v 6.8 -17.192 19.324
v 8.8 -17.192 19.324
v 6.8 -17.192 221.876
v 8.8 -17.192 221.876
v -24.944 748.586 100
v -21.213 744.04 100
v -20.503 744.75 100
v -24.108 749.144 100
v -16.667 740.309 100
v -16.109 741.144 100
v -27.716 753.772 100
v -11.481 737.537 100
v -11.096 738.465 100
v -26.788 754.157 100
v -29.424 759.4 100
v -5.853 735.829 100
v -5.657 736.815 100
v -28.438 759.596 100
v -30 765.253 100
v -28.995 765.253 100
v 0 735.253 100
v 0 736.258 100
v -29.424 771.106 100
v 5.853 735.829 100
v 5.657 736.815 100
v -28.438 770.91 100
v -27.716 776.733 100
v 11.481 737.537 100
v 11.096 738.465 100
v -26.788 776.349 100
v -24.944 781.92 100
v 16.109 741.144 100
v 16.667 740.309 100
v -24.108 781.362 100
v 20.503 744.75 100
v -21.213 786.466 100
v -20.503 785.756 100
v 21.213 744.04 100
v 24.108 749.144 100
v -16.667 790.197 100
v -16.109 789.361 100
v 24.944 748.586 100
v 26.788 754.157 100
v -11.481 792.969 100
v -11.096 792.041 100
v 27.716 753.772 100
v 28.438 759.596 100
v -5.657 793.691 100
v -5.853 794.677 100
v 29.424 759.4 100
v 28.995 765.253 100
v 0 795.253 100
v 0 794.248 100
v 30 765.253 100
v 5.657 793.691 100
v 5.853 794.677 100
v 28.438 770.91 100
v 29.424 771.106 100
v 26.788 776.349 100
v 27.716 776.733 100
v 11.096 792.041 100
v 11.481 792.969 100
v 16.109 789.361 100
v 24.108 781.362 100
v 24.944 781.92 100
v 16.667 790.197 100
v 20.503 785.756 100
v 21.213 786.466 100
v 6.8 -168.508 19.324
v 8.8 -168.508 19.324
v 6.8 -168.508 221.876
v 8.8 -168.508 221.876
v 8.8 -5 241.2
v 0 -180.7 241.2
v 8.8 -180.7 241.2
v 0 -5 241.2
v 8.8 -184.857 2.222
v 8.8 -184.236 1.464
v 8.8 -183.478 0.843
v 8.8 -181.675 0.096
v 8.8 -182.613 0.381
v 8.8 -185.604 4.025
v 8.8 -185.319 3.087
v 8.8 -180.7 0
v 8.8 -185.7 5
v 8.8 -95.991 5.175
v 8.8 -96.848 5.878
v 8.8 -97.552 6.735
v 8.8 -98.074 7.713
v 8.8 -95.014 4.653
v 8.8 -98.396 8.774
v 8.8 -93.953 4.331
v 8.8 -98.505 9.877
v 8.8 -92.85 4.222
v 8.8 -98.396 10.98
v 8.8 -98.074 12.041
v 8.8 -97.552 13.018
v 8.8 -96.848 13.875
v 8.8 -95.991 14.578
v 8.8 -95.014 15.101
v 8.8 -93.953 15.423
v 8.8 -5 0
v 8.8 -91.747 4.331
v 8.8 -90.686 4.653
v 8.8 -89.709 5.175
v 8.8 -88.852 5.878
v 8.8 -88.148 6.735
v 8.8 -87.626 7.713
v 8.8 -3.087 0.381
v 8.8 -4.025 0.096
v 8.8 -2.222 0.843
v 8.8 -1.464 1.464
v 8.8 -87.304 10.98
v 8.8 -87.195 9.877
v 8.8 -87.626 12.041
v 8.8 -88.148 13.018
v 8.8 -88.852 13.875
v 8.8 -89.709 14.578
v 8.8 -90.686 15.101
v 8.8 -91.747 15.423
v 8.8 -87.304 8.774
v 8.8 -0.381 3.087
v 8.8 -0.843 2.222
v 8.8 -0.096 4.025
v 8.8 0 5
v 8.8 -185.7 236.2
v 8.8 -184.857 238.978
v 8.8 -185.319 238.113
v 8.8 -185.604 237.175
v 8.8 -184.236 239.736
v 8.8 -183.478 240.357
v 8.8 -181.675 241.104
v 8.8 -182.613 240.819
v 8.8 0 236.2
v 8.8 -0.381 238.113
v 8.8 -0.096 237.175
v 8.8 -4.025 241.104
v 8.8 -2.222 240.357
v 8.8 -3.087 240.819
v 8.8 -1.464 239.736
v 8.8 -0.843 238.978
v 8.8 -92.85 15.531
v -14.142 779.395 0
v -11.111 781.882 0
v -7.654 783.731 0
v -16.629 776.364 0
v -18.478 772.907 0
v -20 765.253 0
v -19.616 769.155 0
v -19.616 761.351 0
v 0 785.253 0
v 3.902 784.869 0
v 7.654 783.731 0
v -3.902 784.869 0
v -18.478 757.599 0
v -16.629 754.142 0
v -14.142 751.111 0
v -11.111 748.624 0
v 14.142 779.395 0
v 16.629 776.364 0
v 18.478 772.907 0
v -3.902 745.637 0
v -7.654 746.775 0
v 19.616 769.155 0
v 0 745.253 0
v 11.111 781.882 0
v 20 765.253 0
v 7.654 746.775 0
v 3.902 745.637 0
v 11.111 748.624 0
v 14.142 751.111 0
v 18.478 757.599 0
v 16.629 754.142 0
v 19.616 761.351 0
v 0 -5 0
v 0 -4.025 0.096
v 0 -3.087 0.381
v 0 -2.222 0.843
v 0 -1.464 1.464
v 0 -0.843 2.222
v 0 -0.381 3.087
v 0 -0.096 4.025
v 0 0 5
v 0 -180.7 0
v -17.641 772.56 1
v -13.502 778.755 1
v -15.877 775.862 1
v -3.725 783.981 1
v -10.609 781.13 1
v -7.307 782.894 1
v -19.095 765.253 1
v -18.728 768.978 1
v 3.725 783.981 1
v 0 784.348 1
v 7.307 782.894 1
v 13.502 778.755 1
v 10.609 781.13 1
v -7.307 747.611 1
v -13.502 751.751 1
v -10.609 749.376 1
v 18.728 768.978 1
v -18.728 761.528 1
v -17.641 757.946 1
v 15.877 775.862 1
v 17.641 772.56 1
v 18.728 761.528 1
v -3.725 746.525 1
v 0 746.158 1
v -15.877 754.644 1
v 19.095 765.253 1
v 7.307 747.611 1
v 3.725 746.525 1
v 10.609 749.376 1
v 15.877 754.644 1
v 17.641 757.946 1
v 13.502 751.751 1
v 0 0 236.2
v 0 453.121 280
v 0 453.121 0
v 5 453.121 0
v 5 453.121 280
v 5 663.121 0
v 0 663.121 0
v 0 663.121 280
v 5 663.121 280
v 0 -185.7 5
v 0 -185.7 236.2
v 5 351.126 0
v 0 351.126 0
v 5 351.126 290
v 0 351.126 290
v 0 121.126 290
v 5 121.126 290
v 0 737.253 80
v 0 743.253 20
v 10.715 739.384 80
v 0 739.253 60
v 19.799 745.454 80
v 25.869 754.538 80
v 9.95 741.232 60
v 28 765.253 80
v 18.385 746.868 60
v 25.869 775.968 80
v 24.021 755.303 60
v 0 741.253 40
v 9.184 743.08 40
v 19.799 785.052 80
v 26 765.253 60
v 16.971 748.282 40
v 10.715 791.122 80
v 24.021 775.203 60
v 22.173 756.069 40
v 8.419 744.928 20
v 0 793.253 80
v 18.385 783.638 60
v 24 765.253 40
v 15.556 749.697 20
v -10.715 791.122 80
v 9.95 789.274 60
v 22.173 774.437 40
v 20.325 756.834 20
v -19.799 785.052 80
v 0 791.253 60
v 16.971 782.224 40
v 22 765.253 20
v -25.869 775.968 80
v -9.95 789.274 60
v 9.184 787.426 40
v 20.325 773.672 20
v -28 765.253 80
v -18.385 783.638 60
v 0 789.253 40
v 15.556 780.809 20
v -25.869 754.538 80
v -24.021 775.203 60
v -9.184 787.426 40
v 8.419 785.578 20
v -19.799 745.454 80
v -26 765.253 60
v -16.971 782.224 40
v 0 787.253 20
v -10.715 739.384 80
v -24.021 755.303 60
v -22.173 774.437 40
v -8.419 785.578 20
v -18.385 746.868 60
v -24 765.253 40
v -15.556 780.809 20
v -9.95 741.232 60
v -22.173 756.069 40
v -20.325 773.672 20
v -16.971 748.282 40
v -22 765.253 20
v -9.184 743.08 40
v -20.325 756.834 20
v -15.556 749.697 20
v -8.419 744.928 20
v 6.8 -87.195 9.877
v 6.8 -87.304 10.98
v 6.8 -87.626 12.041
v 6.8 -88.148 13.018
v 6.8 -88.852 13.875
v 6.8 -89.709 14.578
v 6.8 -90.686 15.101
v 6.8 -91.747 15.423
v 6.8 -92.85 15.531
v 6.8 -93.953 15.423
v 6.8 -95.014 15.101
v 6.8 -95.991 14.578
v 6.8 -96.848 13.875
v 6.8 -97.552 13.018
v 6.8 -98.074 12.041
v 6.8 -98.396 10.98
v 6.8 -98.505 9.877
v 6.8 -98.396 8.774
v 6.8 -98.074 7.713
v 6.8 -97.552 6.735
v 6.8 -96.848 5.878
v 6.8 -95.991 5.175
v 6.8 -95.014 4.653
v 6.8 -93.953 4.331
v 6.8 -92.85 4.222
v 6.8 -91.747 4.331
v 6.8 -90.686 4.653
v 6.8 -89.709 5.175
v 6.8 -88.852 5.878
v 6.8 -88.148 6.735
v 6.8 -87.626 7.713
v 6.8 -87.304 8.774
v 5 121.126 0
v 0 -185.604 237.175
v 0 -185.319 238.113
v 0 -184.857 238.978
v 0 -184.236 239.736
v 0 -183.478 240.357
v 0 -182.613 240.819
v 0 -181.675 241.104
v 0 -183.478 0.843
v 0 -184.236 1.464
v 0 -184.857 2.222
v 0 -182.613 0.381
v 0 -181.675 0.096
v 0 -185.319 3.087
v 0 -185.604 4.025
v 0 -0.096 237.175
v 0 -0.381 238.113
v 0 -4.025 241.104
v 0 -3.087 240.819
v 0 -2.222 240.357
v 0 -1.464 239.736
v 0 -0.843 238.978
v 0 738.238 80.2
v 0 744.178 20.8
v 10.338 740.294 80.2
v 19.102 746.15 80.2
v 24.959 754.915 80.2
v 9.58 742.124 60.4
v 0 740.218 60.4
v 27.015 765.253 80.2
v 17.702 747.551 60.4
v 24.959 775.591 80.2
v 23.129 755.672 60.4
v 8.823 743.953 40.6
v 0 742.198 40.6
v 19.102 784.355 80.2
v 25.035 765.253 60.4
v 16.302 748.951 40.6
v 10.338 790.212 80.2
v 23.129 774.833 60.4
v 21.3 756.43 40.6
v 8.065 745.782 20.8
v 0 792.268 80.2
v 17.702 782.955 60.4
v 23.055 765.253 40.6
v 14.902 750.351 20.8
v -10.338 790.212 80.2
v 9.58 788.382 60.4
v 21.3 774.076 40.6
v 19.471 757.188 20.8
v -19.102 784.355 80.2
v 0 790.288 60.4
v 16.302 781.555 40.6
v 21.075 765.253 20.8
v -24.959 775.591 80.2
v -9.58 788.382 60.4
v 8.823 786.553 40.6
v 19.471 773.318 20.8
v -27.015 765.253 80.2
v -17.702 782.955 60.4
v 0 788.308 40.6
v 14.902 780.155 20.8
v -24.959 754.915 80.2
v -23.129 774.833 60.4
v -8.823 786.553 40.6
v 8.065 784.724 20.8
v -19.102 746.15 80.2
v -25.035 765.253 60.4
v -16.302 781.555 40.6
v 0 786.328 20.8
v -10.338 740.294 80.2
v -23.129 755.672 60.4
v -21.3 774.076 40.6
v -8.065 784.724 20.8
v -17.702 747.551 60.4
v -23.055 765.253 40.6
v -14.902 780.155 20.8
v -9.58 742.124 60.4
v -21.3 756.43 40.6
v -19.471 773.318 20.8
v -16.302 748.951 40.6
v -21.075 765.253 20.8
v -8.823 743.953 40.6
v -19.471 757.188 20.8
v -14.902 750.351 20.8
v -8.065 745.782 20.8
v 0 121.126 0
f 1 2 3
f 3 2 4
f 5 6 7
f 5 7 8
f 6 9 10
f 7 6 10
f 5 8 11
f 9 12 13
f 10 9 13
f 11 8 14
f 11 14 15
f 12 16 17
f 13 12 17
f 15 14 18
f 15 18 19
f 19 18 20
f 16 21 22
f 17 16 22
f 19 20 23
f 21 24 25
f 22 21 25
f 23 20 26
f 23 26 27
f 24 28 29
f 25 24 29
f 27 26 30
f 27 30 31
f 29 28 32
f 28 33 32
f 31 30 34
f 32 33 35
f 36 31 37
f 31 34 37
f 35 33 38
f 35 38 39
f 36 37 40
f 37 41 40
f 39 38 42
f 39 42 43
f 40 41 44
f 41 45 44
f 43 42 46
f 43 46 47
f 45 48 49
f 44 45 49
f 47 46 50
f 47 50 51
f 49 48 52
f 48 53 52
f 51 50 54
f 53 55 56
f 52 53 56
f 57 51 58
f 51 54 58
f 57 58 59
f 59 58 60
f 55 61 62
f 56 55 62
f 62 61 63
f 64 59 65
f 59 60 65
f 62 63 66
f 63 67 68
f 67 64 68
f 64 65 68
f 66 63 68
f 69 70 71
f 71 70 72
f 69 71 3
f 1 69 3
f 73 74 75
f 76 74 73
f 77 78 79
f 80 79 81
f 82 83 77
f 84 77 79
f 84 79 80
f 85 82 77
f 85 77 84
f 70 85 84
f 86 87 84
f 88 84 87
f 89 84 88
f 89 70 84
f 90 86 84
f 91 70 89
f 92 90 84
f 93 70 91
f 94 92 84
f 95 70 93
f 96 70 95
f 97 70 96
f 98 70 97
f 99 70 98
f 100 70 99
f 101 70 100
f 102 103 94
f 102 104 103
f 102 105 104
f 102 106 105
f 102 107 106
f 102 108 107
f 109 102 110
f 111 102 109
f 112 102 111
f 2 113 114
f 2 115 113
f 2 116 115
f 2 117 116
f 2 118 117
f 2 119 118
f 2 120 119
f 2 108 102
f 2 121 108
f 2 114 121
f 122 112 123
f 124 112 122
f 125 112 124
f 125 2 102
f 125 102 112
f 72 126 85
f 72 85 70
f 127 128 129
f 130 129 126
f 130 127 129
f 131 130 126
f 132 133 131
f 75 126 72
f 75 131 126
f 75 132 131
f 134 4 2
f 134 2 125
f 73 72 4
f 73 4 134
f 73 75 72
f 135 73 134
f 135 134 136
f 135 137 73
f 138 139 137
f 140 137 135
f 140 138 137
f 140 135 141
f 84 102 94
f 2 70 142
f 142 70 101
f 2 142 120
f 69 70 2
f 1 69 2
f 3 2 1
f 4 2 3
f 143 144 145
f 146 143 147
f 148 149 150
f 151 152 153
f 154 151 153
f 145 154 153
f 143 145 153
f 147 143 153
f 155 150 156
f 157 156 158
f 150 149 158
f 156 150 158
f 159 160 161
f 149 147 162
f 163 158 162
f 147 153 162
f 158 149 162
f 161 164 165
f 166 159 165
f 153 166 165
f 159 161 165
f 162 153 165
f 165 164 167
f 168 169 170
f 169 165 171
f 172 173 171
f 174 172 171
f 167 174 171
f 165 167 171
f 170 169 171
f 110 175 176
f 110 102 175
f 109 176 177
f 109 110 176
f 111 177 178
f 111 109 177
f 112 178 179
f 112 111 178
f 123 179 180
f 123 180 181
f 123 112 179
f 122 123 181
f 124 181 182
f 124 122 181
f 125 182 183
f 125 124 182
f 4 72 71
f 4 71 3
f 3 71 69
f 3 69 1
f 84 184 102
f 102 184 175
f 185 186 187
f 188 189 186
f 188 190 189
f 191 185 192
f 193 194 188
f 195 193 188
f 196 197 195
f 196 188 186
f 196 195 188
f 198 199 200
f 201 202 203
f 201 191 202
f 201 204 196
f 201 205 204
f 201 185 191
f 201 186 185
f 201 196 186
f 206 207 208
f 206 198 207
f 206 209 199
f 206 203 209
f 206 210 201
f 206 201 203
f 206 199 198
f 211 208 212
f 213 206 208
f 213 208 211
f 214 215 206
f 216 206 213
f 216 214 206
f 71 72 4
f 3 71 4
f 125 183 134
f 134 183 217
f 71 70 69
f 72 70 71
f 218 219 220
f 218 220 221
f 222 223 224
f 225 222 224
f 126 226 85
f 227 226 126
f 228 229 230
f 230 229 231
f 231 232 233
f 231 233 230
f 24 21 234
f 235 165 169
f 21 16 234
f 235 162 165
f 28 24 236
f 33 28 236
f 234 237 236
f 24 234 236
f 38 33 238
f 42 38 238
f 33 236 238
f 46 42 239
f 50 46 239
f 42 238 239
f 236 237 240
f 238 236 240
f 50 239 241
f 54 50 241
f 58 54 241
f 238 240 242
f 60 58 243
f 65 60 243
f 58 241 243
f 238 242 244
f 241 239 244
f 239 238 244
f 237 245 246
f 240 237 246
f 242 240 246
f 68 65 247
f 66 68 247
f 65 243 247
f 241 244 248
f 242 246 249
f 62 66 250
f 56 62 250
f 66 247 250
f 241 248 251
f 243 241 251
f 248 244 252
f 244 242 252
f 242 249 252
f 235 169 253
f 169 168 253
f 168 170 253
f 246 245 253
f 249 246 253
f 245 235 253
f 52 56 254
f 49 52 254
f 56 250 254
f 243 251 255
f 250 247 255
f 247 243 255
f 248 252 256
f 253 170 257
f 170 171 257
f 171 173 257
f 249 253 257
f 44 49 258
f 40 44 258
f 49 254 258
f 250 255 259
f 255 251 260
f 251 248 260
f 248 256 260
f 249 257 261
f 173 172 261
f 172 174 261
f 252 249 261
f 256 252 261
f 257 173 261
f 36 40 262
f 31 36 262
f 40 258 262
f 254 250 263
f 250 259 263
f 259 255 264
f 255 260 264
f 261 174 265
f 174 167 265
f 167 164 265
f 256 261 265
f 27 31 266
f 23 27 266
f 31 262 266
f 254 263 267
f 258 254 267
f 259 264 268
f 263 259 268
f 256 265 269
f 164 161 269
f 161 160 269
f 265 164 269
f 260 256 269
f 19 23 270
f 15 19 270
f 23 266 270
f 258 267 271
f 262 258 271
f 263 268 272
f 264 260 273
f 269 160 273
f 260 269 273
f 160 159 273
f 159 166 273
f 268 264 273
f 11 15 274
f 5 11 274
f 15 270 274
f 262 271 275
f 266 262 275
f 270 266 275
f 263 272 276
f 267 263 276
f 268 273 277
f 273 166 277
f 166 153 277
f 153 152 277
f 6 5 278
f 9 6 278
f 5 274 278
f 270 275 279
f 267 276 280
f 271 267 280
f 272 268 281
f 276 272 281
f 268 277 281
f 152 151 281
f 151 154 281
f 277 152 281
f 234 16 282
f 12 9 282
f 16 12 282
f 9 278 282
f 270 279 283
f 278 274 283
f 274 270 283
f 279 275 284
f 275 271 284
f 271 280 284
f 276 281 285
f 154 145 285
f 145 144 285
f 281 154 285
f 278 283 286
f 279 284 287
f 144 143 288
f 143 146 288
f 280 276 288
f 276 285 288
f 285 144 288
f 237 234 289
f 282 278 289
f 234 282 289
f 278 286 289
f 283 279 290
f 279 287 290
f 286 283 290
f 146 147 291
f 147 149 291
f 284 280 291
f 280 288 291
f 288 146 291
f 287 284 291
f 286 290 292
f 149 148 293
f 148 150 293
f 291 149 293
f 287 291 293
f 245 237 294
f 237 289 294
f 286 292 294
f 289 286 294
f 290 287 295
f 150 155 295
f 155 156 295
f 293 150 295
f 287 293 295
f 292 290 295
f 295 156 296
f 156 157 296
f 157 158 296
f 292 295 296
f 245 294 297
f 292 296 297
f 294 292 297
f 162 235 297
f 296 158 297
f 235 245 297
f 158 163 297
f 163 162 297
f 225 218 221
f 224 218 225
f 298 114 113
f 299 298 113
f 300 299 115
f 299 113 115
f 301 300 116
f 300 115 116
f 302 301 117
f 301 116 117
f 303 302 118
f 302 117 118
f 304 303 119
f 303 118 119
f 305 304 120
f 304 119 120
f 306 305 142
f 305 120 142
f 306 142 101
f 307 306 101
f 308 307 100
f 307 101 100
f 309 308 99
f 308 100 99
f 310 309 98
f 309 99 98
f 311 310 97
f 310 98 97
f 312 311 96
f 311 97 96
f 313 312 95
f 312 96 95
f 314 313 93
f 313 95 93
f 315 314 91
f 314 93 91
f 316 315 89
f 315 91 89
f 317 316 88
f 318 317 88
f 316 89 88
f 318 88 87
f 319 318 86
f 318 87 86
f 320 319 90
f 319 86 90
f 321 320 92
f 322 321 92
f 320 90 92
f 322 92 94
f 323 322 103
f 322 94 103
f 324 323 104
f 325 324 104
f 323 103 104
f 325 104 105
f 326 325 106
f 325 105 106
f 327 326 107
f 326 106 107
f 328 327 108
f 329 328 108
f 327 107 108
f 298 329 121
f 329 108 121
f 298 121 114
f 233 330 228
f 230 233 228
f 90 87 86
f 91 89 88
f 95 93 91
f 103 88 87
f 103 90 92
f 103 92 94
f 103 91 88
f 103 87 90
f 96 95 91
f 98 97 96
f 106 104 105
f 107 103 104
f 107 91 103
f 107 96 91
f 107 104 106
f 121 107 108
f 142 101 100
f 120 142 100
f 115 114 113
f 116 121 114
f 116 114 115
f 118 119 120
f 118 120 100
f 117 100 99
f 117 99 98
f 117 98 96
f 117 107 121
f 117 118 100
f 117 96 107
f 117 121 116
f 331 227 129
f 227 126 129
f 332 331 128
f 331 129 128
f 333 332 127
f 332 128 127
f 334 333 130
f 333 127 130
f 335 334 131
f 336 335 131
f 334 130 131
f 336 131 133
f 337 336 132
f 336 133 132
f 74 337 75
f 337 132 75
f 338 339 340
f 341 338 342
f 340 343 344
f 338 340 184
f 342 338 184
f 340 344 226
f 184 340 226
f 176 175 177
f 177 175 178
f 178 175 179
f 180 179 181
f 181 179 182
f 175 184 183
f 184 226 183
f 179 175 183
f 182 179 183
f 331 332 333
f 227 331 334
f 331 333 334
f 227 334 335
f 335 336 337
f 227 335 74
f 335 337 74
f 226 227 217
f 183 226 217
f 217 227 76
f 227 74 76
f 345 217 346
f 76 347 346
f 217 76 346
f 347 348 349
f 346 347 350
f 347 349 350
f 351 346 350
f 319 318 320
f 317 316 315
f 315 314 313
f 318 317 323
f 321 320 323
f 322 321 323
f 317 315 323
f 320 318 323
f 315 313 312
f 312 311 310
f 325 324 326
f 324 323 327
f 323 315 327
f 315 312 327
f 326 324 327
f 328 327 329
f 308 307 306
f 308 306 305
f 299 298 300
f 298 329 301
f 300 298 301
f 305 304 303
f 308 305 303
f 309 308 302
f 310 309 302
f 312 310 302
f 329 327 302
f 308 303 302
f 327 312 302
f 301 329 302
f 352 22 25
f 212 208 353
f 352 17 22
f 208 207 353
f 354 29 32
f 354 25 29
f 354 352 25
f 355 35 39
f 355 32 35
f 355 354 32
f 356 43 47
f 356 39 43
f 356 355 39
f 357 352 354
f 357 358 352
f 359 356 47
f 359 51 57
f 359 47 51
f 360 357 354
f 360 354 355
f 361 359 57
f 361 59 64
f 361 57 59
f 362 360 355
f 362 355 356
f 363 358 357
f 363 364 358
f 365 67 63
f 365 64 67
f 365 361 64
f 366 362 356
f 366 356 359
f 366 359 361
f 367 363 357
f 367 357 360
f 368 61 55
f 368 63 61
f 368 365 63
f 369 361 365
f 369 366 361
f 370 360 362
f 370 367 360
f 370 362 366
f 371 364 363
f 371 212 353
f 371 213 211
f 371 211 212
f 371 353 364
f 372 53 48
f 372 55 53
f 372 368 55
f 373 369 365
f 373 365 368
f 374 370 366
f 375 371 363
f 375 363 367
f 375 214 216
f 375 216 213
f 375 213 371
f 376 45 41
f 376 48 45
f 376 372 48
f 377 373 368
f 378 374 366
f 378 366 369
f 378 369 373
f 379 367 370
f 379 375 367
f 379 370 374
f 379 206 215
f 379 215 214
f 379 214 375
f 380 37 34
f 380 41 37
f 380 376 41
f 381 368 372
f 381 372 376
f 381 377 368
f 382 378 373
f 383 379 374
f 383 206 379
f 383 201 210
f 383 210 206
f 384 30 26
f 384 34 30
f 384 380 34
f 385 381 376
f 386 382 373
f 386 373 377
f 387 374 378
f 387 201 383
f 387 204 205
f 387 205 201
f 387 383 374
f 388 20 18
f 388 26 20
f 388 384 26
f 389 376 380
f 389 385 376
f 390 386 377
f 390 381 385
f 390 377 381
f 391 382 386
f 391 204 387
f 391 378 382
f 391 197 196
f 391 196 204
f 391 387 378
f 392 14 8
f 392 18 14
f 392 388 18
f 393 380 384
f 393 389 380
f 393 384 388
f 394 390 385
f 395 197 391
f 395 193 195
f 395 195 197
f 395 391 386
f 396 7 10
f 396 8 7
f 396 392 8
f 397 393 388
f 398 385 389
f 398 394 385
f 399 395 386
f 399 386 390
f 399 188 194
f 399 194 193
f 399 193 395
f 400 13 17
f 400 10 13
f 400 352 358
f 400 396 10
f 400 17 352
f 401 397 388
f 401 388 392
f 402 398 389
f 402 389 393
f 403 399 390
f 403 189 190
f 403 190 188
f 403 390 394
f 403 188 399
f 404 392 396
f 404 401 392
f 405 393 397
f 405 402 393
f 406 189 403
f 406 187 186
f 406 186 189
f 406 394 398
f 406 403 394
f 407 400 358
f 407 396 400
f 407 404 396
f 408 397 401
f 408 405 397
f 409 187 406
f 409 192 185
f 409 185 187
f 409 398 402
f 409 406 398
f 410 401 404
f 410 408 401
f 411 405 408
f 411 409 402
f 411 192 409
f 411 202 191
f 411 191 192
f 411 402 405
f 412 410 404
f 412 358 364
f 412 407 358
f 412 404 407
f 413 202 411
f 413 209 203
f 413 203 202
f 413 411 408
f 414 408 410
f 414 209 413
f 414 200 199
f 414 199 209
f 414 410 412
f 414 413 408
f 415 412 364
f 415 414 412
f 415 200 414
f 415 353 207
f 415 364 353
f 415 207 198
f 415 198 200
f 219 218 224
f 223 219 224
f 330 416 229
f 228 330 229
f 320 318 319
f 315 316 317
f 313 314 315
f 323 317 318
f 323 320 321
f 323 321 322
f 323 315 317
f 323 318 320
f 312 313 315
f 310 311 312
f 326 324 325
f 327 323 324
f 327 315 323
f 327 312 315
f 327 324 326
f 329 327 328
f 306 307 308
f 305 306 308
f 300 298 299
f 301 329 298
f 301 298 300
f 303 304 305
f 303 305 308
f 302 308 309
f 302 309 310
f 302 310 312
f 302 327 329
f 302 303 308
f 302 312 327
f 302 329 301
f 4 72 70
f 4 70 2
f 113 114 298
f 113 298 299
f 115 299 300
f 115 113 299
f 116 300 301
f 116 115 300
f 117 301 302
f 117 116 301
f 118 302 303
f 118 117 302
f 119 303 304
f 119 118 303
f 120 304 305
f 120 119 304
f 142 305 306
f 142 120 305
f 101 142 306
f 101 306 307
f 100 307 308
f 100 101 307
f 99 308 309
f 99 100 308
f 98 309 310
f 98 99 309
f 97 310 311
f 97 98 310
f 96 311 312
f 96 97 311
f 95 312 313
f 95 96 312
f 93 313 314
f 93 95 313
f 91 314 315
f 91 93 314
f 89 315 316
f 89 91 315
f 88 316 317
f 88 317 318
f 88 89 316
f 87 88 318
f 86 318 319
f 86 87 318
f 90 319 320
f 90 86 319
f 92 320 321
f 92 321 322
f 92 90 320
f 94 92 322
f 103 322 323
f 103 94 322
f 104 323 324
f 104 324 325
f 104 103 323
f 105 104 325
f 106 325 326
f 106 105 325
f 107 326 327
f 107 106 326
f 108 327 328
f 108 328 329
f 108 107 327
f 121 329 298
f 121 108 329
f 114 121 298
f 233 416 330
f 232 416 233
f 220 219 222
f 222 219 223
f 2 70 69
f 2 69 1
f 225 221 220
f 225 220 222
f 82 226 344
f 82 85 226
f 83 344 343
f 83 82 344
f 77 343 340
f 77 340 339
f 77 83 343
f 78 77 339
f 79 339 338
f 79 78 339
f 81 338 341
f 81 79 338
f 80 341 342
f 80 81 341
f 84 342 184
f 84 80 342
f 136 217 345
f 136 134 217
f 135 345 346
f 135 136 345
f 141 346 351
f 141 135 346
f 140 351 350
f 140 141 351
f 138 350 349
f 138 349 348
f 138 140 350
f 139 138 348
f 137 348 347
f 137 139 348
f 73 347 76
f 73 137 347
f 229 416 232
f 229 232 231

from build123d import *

# Parameters (mm, degrees)
F0_W     = 185.7
F0_H     = 241.2
F1_DEPTH = 8.8
F2_R     = 5
F3_W     = 151.3151817799
F3_H     = 202.5515388392
F4_DEPTH = 2
F3_R     = 5.6545276432
F0_W_2   = 230
F0_H_2   = 290
F6_DEPTH = 5
F0_W_3   = 210
F0_H_3   = 280
F8_T     = -1


with BuildPart() as f1:
    # F0 (on Right) → F1 (new body)
    with BuildSketch(Plane.YZ):
        with Locations((-92.85, 120.6)):
            Rectangle(F0_W, F0_H)
    extrude(amount=F1_DEPTH)

    # F2
    f2_edges = [f1.edges().sort_by_distance(p)[0] for p in [
        (4.4, -185.7, 241.2),
        (4.4, 0, 241.2),
        (4.4, -185.7, 0),
        (4.4, 0, 0),
    ]]
    fillet(f2_edges, radius=F2_R)


with BuildPart() as f4:
    # F3 (on face) → F4 (new body)
    with BuildSketch(Plane.YZ.offset(8.8)):
        with Locations((-92.85, 120.6)):
            Rectangle(F3_W, F3_H)
    extrude(amount=-F4_DEPTH)


with BuildPart() as f4b:
    # F3 (on face) → F4, piece 2 (new body)
    with BuildSketch(Plane.YZ.offset(8.8)):
        with Locations((-92.85, 9.8767345771)):
            Circle(F3_R)
    extrude(amount=-F4_DEPTH)


with BuildPart() as f1_1:
    add(f1.part)

    # F5: cut F4, F4b
    add(f4.part, mode=Mode.SUBTRACT)
    add(f4b.part, mode=Mode.SUBTRACT)


with BuildPart() as f6:
    # F0 (on Right) → F6 (new body)
    with BuildSketch(Plane.YZ):
        with Locations((236.1263760924, 145)):
            Rectangle(F0_W_2, F0_H_2)
    extrude(amount=F6_DEPTH)


with BuildPart() as f6b:
    # F0 (on Right) → F6, piece 2 (new body)
    with BuildSketch(Plane.YZ):
        with Locations((558.1211555004, 140)):
            Rectangle(F0_W_3, F0_H_3)
    extrude(amount=F6_DEPTH)


with BuildPart() as f7:
    # F0 (on Right) → F7 (revolve)
    with BuildSketch(Plane.YZ):
        Polygon((745.2529549599, 0), (765.2529549599, 0), (765.2529549599, 100), (735.2529549599, 100), align=None)
    revolve(axis=Axis((0, 765.2529549599, 50), (0, 0, 1)))

    # F8
    f8_openings = [f7.faces().sort_by_distance(p)[0] for p in [
        (0, 765.252955, 100),
    ]]
    offset(amount=F8_T, openings=f8_openings)


solid = Compound([f4.part, f4b.part, f1_1.part, f6.part, f6b.part, f7.part])
